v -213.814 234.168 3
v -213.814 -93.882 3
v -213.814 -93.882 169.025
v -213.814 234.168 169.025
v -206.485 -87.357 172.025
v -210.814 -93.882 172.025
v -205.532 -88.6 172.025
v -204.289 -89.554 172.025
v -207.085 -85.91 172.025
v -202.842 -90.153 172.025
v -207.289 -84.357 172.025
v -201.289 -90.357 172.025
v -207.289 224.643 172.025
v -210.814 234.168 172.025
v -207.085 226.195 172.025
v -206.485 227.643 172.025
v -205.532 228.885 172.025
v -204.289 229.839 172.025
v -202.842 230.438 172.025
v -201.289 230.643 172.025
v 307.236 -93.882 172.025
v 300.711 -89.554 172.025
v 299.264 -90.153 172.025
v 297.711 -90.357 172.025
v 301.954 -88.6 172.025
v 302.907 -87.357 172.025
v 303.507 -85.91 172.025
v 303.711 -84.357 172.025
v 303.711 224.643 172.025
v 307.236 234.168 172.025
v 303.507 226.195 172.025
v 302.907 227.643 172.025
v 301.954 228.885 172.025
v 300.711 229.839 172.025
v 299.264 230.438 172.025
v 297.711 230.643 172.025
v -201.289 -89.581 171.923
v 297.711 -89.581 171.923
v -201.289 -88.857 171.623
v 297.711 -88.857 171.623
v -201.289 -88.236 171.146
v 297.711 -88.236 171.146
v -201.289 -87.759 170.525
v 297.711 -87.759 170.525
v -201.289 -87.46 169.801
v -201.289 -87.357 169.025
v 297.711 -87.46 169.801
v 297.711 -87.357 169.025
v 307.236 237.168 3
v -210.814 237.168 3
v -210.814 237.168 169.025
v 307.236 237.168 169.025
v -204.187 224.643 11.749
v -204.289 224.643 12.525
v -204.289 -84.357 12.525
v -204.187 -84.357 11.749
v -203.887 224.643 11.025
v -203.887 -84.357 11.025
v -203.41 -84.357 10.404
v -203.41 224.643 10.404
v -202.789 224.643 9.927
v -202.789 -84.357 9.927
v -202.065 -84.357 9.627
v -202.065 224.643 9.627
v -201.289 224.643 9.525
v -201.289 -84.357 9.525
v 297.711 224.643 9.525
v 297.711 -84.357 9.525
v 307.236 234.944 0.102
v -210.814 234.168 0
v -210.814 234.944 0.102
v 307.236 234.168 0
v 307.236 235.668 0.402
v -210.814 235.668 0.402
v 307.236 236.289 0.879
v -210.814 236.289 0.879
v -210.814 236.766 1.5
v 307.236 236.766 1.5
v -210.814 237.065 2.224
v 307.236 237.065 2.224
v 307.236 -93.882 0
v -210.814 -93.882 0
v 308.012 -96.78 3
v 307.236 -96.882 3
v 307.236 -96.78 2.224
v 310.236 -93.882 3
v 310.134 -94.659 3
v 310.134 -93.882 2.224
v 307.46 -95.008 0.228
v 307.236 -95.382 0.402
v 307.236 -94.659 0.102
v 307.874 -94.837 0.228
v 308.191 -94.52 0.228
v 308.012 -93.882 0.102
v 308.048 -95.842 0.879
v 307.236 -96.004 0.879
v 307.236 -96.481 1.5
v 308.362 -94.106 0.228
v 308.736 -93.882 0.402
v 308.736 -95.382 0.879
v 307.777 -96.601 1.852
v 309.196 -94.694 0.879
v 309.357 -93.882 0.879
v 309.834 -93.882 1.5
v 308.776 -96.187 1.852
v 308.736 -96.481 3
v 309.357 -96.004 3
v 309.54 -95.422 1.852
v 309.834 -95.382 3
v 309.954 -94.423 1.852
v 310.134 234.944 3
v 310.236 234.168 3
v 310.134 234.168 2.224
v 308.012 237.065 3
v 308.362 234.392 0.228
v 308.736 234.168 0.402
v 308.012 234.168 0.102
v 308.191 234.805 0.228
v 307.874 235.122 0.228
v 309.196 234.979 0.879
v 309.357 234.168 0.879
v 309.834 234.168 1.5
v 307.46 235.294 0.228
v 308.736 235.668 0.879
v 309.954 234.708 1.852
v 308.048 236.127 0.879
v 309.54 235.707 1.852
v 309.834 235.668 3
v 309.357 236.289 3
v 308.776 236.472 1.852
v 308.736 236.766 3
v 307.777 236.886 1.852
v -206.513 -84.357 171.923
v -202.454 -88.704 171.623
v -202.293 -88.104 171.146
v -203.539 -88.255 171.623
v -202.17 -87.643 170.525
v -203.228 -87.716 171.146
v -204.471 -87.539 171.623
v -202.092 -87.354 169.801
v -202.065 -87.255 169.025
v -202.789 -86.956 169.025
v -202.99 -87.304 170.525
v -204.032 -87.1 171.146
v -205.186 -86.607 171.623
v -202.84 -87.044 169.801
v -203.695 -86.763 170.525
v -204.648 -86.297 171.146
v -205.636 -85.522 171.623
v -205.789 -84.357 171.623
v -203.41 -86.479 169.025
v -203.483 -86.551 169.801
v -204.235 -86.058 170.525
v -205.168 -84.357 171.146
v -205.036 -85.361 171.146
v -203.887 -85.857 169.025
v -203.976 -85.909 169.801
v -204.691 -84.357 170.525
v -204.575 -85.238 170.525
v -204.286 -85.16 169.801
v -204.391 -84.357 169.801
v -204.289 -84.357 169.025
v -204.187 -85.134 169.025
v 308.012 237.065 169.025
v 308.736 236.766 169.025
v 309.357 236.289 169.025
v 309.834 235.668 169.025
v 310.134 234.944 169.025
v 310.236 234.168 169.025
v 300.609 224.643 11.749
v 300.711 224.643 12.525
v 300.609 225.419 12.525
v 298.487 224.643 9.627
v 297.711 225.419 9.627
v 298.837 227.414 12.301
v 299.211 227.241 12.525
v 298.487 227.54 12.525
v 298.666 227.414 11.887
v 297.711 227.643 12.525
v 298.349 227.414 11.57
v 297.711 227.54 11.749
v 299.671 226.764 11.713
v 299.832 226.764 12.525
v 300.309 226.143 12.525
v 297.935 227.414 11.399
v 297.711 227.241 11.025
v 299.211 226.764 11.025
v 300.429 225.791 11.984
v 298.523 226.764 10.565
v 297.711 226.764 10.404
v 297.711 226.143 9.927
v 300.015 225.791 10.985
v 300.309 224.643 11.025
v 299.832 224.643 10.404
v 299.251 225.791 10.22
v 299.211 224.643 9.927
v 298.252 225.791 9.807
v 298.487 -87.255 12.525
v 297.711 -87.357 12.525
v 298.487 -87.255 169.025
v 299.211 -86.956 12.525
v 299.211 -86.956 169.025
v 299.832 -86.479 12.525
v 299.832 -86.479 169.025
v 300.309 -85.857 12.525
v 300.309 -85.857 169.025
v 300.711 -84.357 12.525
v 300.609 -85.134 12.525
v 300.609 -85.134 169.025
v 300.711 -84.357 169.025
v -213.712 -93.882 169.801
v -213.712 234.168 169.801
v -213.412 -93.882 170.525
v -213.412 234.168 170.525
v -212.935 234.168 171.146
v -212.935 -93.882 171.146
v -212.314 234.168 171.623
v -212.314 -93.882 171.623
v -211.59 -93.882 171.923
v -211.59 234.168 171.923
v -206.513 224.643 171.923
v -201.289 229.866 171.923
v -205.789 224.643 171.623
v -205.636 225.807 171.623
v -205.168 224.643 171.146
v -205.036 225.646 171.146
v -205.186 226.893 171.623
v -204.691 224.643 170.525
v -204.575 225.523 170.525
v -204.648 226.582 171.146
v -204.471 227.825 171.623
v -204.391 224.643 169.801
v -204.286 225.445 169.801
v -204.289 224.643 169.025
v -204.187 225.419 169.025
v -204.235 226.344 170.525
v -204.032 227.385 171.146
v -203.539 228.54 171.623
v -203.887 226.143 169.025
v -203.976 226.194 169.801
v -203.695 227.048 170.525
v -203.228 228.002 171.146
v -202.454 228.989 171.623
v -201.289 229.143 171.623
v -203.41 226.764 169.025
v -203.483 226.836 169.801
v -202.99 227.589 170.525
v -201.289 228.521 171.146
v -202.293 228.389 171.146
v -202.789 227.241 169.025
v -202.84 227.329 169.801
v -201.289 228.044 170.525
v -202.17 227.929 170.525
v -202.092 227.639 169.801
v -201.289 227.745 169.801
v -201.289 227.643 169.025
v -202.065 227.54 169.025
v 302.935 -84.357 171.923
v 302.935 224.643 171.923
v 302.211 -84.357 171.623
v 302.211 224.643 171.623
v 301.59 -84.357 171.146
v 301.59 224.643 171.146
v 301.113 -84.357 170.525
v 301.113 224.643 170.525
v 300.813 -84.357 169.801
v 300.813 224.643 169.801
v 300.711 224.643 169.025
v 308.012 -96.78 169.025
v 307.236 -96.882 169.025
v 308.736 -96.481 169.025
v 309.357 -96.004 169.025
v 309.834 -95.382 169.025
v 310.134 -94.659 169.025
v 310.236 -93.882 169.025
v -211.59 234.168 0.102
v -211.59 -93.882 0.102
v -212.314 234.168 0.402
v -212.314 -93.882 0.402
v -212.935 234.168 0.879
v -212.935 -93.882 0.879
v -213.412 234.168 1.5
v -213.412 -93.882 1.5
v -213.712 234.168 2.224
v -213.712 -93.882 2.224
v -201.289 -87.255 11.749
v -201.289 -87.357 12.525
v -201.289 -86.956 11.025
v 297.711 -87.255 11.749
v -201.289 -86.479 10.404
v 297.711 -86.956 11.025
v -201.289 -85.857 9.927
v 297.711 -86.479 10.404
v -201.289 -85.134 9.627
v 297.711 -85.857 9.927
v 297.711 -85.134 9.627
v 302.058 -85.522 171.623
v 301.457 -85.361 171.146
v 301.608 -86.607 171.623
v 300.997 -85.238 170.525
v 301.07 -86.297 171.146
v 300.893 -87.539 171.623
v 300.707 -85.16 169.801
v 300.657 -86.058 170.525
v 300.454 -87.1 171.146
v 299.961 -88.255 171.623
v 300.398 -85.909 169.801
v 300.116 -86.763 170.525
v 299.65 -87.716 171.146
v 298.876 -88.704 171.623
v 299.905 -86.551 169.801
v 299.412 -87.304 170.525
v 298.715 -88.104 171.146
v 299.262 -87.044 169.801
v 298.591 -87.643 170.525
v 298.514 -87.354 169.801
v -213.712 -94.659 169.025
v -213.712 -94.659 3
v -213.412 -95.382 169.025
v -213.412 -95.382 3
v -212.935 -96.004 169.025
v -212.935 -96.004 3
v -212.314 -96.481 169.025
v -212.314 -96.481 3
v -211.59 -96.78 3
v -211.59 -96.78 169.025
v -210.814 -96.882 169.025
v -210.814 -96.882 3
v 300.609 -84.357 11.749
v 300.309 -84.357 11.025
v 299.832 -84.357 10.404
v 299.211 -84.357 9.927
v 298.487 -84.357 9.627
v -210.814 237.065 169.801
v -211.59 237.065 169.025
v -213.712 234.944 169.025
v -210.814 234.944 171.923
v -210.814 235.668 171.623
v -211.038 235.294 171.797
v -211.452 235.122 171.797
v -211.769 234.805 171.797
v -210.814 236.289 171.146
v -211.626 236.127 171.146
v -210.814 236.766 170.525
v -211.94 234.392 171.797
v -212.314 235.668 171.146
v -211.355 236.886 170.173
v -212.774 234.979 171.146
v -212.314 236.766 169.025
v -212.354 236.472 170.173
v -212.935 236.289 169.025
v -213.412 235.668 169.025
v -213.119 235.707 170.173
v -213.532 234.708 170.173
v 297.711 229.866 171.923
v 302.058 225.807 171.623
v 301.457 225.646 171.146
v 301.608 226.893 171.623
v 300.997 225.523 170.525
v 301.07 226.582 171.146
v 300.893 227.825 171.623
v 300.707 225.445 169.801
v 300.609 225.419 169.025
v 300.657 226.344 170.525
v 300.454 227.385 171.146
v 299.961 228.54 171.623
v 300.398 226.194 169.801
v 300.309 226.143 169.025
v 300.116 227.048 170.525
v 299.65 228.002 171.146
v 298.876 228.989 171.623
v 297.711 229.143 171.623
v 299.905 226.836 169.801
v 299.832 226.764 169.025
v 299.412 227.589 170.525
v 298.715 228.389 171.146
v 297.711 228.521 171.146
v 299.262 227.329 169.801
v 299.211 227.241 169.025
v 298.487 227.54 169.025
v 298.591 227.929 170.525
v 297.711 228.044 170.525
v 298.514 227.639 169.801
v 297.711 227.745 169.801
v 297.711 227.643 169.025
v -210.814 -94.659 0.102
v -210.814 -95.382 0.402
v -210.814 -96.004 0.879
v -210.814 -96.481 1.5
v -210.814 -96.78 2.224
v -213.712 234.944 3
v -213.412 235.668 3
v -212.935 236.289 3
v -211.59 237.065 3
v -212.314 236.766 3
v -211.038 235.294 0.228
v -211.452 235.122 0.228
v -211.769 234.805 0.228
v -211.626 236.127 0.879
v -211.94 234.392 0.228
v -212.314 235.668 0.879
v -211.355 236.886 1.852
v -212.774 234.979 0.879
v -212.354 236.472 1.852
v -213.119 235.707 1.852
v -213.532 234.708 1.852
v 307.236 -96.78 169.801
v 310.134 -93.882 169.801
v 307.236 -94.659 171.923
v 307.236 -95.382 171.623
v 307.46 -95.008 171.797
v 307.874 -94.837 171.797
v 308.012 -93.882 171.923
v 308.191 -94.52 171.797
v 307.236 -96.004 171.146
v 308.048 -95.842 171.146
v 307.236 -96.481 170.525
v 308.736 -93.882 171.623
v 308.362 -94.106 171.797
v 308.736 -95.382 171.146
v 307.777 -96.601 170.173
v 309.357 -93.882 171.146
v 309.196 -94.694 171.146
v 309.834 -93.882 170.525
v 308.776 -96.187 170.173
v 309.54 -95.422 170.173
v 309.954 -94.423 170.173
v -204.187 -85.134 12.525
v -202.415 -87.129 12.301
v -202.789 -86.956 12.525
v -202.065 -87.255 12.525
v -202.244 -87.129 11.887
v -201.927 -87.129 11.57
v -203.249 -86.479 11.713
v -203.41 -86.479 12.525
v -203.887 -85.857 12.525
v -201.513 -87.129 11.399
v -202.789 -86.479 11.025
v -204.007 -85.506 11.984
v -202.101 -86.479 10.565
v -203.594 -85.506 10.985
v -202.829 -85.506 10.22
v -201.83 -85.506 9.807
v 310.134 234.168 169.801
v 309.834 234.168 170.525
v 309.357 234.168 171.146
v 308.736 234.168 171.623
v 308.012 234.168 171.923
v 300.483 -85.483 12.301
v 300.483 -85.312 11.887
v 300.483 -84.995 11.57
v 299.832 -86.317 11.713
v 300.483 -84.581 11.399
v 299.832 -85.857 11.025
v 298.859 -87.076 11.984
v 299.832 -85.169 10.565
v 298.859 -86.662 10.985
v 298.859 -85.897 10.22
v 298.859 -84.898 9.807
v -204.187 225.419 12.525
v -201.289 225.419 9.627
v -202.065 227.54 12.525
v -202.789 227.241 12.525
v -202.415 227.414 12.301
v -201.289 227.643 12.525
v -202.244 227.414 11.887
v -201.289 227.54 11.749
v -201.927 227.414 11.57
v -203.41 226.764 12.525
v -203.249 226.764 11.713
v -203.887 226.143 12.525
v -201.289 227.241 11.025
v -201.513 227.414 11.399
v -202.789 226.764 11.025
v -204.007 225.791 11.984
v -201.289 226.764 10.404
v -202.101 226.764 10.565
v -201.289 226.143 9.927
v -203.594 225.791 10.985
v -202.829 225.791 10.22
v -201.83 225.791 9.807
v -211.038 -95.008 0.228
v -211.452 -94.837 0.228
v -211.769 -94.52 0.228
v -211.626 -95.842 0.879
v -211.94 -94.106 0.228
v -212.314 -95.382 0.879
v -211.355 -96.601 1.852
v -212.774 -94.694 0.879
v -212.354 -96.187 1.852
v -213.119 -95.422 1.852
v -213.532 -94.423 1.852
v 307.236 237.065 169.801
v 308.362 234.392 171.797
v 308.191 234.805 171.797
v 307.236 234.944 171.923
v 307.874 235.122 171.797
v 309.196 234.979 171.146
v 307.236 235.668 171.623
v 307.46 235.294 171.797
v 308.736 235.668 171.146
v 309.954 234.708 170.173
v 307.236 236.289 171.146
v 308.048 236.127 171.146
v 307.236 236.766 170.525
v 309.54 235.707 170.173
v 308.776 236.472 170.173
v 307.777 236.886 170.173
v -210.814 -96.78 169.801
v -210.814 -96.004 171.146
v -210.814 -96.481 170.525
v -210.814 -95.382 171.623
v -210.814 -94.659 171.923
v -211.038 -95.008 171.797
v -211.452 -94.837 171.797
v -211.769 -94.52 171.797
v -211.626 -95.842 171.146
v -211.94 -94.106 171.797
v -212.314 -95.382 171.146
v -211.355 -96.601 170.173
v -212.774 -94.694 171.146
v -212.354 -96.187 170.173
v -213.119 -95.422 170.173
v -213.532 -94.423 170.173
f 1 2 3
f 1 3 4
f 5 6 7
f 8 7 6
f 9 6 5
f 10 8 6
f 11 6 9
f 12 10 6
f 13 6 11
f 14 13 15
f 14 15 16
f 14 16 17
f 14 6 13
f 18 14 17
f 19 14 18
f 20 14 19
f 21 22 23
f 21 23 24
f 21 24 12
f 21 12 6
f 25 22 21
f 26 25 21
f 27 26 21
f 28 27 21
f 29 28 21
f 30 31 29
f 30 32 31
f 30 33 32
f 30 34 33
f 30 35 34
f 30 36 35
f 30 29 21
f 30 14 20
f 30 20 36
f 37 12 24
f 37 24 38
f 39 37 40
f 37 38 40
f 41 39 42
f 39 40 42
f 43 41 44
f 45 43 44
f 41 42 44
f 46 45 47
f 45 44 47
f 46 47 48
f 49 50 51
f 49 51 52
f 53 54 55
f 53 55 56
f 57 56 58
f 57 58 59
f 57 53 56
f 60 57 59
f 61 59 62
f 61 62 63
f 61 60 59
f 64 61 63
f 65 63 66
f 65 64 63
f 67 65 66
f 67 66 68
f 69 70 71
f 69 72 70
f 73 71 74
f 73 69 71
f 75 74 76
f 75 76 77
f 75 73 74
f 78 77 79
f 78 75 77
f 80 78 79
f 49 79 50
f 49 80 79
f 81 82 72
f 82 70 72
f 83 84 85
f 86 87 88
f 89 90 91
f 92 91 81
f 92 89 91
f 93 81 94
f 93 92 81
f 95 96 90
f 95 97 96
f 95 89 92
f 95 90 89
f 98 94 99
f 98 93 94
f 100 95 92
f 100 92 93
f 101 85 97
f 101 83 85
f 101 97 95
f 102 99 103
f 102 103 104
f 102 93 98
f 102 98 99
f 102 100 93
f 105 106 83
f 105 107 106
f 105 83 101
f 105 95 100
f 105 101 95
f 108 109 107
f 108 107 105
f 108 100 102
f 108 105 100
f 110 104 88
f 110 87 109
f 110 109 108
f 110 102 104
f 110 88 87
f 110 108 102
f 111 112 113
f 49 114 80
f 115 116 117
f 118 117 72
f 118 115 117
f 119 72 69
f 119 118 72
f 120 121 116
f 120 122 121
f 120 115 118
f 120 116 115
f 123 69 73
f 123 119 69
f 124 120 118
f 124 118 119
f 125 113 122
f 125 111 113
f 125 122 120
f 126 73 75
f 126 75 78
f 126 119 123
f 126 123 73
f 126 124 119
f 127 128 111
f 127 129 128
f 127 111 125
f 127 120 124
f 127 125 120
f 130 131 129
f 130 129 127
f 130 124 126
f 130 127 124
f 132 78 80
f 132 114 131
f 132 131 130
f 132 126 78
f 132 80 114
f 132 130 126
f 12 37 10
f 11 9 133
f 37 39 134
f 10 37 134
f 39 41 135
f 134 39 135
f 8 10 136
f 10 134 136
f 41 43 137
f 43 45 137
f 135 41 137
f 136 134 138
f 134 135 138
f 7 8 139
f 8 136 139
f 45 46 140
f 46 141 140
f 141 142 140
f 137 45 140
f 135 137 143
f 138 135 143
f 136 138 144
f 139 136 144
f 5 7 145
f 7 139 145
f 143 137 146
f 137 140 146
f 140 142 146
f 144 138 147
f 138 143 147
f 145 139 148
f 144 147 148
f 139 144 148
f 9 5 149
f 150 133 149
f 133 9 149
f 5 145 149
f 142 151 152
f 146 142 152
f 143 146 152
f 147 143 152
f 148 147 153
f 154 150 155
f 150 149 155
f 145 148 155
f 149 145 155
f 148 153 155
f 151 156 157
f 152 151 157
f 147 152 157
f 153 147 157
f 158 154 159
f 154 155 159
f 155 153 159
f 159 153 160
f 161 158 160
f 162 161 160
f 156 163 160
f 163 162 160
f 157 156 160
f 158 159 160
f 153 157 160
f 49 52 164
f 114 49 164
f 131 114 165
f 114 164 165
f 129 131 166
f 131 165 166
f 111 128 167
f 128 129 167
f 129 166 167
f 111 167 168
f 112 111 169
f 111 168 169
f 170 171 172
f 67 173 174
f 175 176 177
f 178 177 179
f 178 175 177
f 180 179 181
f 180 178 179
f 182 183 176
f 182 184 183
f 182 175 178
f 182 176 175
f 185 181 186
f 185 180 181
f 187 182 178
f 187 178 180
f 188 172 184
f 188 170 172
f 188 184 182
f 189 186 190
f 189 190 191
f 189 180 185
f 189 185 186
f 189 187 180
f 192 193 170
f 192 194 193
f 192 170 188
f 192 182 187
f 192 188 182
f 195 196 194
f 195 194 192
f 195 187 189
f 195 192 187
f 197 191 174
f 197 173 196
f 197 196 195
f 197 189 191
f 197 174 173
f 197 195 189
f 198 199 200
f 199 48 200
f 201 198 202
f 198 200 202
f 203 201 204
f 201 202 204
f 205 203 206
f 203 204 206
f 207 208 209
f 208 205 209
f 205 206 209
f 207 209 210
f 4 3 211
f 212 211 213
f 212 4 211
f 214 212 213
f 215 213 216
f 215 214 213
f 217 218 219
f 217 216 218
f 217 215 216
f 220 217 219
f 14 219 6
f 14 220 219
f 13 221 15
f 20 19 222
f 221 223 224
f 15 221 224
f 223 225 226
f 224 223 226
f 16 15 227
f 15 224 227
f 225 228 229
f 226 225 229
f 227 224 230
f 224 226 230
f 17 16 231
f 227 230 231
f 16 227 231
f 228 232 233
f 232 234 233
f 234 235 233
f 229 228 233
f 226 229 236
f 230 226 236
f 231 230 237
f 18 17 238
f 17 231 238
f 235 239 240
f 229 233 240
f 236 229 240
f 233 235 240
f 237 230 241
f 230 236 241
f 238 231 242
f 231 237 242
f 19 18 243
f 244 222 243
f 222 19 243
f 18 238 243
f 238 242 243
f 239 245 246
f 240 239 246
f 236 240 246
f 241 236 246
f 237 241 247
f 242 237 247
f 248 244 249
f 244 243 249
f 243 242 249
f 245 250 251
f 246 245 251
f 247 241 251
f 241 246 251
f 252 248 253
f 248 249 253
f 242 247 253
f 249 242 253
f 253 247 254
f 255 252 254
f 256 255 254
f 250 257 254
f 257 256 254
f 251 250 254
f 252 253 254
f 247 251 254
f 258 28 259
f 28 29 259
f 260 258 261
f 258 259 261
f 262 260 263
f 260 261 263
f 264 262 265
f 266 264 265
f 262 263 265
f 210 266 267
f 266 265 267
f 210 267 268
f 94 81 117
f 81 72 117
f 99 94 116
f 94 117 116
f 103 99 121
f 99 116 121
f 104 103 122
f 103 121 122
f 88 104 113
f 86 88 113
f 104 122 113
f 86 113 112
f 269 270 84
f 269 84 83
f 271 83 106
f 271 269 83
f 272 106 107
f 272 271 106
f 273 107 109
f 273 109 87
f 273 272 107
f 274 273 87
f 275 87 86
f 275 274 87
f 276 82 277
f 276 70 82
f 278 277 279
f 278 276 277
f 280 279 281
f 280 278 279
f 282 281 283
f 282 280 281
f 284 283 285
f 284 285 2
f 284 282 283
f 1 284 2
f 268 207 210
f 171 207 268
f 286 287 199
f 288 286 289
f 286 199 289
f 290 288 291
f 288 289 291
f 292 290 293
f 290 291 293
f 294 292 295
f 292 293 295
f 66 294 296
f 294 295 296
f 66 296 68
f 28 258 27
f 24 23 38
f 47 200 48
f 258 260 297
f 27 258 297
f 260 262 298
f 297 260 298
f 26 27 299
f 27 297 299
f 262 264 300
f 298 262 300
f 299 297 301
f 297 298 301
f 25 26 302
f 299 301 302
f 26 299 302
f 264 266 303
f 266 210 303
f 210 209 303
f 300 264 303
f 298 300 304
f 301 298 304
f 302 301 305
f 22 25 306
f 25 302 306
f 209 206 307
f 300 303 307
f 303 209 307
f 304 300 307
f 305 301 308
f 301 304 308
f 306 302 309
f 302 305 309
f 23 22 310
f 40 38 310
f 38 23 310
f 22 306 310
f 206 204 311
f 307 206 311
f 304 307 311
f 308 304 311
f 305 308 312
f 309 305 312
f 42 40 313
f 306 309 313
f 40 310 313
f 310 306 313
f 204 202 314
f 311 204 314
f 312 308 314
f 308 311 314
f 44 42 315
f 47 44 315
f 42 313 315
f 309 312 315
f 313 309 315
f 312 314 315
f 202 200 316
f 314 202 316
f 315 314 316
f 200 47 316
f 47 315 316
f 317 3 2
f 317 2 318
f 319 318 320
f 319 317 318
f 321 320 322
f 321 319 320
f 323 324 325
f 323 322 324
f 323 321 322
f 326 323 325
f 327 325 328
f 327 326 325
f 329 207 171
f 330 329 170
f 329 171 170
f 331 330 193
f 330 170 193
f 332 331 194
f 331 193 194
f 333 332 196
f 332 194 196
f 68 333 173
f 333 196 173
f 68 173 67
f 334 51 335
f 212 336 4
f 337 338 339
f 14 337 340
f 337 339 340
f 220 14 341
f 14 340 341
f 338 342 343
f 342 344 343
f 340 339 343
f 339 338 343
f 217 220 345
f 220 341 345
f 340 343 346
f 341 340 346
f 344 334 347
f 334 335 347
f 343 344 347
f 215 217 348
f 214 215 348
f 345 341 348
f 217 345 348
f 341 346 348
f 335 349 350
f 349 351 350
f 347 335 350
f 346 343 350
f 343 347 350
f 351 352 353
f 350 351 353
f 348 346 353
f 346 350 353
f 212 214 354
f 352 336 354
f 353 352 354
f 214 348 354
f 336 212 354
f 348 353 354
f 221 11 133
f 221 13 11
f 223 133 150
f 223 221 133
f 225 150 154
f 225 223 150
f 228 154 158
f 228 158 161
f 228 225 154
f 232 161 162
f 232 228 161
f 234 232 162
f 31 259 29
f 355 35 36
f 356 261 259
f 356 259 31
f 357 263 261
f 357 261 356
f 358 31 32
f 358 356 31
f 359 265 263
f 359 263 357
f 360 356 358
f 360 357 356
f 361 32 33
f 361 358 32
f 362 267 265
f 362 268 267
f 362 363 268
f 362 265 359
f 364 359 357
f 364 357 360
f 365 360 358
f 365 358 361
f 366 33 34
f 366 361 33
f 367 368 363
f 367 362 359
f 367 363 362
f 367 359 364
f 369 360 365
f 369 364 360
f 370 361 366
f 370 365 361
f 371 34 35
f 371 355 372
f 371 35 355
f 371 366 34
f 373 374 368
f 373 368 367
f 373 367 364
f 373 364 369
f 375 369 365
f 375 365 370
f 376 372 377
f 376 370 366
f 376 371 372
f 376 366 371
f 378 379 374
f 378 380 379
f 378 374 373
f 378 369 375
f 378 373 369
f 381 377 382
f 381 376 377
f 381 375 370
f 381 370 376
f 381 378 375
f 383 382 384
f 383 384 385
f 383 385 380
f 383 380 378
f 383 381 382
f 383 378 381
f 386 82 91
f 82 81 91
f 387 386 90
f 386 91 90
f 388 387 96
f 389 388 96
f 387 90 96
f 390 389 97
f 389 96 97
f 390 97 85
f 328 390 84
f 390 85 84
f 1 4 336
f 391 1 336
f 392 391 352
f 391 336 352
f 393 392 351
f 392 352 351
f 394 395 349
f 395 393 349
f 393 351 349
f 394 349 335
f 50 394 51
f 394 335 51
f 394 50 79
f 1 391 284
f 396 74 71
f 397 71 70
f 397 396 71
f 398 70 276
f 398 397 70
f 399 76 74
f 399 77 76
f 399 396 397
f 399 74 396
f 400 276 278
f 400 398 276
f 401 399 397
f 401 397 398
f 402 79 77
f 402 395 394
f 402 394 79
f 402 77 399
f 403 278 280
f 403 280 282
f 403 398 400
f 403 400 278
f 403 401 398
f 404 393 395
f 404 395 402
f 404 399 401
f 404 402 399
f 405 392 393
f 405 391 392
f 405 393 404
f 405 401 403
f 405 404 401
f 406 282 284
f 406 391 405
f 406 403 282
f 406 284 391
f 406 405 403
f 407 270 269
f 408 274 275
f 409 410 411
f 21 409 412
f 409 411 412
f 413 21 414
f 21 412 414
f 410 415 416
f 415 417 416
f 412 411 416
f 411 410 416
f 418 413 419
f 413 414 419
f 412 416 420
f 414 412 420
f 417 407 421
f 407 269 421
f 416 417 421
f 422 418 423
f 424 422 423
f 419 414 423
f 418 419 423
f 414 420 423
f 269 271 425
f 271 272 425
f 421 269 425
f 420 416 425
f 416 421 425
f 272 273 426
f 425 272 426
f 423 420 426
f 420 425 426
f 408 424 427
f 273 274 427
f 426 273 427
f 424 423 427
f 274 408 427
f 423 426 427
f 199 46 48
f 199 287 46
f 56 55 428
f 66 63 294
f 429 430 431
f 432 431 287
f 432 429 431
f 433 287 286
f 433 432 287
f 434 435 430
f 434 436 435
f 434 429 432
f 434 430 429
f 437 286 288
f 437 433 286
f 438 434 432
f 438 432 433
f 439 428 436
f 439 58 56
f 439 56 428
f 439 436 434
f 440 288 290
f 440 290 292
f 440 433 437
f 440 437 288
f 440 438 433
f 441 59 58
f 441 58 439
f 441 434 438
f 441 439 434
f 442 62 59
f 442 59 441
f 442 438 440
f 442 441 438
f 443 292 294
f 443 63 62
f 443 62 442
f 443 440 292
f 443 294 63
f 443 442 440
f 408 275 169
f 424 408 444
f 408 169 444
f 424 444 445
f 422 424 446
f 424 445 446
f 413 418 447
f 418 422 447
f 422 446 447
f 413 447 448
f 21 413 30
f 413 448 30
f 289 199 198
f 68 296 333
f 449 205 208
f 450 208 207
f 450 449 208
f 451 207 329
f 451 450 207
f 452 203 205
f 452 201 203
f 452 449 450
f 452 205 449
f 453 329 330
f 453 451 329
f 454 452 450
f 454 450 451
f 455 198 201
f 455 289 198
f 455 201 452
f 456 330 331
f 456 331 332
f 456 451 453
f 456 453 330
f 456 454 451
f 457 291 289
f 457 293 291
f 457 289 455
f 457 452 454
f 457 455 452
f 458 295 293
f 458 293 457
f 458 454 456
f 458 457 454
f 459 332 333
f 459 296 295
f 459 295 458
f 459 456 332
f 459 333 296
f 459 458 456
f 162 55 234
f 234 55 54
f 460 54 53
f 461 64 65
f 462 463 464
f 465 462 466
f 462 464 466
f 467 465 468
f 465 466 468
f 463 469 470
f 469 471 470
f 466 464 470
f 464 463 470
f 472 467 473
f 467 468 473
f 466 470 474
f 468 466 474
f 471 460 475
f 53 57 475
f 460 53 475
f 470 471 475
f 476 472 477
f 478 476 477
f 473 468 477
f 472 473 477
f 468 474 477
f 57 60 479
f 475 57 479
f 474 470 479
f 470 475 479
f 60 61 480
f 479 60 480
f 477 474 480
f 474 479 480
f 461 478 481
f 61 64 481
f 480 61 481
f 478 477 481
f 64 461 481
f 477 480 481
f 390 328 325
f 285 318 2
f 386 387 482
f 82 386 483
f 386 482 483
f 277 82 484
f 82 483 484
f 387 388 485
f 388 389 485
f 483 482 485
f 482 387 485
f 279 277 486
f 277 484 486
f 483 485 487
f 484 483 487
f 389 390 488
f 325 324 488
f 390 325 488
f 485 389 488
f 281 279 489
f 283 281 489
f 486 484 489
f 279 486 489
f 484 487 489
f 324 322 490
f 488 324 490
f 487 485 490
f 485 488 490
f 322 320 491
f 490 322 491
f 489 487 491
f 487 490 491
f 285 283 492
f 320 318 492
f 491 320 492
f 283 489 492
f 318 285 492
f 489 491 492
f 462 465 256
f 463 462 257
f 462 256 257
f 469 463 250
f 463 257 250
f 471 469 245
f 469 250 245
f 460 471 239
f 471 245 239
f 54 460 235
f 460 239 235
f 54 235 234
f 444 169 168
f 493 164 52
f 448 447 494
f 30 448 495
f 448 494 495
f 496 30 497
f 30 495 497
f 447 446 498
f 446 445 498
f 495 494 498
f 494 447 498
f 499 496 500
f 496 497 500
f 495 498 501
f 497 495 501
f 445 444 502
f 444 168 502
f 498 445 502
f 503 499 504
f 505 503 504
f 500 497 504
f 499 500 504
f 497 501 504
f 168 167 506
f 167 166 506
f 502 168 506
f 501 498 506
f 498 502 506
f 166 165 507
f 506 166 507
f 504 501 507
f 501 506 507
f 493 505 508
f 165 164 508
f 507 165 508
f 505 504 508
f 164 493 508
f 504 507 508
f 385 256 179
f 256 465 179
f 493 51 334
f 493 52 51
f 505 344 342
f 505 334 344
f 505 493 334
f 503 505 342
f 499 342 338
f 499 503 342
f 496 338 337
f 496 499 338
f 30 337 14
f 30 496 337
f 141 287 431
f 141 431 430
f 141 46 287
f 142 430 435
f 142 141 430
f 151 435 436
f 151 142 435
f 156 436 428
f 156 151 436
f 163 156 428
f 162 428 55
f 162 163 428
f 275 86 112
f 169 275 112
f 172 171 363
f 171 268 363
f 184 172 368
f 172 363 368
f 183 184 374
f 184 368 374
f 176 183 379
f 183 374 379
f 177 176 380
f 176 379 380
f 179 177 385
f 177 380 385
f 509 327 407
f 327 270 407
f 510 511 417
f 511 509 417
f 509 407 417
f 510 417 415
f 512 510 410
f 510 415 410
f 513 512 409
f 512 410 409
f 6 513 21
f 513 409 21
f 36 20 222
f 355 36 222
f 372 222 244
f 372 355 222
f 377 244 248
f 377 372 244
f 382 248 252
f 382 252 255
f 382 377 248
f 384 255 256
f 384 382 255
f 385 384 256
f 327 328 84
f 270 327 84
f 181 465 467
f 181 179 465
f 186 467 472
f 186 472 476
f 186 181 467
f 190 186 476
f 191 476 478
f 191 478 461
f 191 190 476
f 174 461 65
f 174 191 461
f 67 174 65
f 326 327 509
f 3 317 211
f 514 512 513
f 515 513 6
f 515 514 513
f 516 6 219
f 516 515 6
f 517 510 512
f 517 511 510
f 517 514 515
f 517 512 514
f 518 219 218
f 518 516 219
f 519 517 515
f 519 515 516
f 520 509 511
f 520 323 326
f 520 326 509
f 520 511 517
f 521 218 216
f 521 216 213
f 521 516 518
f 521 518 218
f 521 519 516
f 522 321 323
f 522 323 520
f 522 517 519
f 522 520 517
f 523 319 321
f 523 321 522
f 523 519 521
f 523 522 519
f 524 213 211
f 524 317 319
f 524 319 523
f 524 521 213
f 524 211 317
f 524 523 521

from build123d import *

# Parameters (mm, degrees)
F0_W     = 524.05
F0_H     = 334.05
F0_W_2   = 505
F0_H_2   = 315
F1_DEPTH = 172.025
F2_DEPTH = 9.525
F3_R     = 3


with BuildPart() as f1:
    # F0 (on Top) → F1 (new body)
    with BuildSketch(Plane.XY):
        with Locations((48.210962, 70.14254)):
            Rectangle(F0_W, F0_H)
        with Locations((48.210962, 70.14254)):
            Rectangle(F0_W_2, F0_H_2, mode=Mode.SUBTRACT)
    extrude(amount=F1_DEPTH)

    # F0 (on Top) → F2 (join)
    with BuildSketch(Plane.XY):
        with Locations((48.210962, 70.14254)):
            Rectangle(F0_W_2, F0_H_2)
    extrude(amount=F2_DEPTH)

    # F3
    f3_edges = [f1.edges().sort_by_distance(p)[0] for p in [
        (-213.814038, -96.88246, 86.0125),
        (310.235962, -96.88246, 86.0125),
        (48.210962, -96.88246, 0),
        (48.210962, -96.88246, 172.025),
        (310.235962, 237.16754, 86.0125),
        (310.235962, 70.14254, 0),
        (310.235962, 70.14254, 172.025),
        (-213.814038, 237.16754, 86.0125),
        (48.210962, 237.16754, 0),
        (48.210962, 237.16754, 172.025),
        (-213.814038, 70.14254, 0),
        (-213.814038, 70.14254, 172.025),
        (300.710962, 70.14254, 172.025),
        (48.210962, -87.35746, 172.025),
        (-204.289038, 70.14254, 172.025),
        (48.210962, 227.64254, 172.025),
        (-204.289038, 70.14254, 9.525),
        (-204.289038, 227.64254, 90.775),
        (-204.289038, -87.35746, 90.775),
        (48.210962, -87.35746, 9.525),
        (300.710962, -87.35746, 90.775),
        (300.710962, 70.14254, 9.525),
        (300.710962, 227.64254, 90.775),
        (48.210962, 227.64254, 9.525),
    ]]
    fillet(f3_edges, radius=F3_R)


solid = f1.part
